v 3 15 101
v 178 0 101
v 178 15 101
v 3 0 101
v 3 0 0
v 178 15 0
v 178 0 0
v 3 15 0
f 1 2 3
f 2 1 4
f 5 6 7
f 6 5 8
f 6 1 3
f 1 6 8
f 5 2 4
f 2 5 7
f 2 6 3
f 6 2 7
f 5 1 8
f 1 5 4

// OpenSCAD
//Switch LCD

//Breite Switch LCD
swlcdb=172;
//Hoehe Switch LCD
swlcdh=101;
//Tiefe Switch LCD
swlcdt=15;

//Switch LCD

//Breite Switch OLED
swoledb=175;
//Hoehe Switch OLED
swoledh=101;
//Tiefe Switch OLED
swoledt=15;

//Abstand zu Lautsprecher L+R
al=5;

//Thickness
t=3;

module switchlcd() {
    translate([(swoledb-swlcdb)/2+t,0,0])
    cube([swlcdb, swlcdt, swlcdh]);
}

switchlcd();

module switcholed() {
    translate([t,0,0])
    cube([swoledb, swoledt, swoledh]);
}

switcholed();
